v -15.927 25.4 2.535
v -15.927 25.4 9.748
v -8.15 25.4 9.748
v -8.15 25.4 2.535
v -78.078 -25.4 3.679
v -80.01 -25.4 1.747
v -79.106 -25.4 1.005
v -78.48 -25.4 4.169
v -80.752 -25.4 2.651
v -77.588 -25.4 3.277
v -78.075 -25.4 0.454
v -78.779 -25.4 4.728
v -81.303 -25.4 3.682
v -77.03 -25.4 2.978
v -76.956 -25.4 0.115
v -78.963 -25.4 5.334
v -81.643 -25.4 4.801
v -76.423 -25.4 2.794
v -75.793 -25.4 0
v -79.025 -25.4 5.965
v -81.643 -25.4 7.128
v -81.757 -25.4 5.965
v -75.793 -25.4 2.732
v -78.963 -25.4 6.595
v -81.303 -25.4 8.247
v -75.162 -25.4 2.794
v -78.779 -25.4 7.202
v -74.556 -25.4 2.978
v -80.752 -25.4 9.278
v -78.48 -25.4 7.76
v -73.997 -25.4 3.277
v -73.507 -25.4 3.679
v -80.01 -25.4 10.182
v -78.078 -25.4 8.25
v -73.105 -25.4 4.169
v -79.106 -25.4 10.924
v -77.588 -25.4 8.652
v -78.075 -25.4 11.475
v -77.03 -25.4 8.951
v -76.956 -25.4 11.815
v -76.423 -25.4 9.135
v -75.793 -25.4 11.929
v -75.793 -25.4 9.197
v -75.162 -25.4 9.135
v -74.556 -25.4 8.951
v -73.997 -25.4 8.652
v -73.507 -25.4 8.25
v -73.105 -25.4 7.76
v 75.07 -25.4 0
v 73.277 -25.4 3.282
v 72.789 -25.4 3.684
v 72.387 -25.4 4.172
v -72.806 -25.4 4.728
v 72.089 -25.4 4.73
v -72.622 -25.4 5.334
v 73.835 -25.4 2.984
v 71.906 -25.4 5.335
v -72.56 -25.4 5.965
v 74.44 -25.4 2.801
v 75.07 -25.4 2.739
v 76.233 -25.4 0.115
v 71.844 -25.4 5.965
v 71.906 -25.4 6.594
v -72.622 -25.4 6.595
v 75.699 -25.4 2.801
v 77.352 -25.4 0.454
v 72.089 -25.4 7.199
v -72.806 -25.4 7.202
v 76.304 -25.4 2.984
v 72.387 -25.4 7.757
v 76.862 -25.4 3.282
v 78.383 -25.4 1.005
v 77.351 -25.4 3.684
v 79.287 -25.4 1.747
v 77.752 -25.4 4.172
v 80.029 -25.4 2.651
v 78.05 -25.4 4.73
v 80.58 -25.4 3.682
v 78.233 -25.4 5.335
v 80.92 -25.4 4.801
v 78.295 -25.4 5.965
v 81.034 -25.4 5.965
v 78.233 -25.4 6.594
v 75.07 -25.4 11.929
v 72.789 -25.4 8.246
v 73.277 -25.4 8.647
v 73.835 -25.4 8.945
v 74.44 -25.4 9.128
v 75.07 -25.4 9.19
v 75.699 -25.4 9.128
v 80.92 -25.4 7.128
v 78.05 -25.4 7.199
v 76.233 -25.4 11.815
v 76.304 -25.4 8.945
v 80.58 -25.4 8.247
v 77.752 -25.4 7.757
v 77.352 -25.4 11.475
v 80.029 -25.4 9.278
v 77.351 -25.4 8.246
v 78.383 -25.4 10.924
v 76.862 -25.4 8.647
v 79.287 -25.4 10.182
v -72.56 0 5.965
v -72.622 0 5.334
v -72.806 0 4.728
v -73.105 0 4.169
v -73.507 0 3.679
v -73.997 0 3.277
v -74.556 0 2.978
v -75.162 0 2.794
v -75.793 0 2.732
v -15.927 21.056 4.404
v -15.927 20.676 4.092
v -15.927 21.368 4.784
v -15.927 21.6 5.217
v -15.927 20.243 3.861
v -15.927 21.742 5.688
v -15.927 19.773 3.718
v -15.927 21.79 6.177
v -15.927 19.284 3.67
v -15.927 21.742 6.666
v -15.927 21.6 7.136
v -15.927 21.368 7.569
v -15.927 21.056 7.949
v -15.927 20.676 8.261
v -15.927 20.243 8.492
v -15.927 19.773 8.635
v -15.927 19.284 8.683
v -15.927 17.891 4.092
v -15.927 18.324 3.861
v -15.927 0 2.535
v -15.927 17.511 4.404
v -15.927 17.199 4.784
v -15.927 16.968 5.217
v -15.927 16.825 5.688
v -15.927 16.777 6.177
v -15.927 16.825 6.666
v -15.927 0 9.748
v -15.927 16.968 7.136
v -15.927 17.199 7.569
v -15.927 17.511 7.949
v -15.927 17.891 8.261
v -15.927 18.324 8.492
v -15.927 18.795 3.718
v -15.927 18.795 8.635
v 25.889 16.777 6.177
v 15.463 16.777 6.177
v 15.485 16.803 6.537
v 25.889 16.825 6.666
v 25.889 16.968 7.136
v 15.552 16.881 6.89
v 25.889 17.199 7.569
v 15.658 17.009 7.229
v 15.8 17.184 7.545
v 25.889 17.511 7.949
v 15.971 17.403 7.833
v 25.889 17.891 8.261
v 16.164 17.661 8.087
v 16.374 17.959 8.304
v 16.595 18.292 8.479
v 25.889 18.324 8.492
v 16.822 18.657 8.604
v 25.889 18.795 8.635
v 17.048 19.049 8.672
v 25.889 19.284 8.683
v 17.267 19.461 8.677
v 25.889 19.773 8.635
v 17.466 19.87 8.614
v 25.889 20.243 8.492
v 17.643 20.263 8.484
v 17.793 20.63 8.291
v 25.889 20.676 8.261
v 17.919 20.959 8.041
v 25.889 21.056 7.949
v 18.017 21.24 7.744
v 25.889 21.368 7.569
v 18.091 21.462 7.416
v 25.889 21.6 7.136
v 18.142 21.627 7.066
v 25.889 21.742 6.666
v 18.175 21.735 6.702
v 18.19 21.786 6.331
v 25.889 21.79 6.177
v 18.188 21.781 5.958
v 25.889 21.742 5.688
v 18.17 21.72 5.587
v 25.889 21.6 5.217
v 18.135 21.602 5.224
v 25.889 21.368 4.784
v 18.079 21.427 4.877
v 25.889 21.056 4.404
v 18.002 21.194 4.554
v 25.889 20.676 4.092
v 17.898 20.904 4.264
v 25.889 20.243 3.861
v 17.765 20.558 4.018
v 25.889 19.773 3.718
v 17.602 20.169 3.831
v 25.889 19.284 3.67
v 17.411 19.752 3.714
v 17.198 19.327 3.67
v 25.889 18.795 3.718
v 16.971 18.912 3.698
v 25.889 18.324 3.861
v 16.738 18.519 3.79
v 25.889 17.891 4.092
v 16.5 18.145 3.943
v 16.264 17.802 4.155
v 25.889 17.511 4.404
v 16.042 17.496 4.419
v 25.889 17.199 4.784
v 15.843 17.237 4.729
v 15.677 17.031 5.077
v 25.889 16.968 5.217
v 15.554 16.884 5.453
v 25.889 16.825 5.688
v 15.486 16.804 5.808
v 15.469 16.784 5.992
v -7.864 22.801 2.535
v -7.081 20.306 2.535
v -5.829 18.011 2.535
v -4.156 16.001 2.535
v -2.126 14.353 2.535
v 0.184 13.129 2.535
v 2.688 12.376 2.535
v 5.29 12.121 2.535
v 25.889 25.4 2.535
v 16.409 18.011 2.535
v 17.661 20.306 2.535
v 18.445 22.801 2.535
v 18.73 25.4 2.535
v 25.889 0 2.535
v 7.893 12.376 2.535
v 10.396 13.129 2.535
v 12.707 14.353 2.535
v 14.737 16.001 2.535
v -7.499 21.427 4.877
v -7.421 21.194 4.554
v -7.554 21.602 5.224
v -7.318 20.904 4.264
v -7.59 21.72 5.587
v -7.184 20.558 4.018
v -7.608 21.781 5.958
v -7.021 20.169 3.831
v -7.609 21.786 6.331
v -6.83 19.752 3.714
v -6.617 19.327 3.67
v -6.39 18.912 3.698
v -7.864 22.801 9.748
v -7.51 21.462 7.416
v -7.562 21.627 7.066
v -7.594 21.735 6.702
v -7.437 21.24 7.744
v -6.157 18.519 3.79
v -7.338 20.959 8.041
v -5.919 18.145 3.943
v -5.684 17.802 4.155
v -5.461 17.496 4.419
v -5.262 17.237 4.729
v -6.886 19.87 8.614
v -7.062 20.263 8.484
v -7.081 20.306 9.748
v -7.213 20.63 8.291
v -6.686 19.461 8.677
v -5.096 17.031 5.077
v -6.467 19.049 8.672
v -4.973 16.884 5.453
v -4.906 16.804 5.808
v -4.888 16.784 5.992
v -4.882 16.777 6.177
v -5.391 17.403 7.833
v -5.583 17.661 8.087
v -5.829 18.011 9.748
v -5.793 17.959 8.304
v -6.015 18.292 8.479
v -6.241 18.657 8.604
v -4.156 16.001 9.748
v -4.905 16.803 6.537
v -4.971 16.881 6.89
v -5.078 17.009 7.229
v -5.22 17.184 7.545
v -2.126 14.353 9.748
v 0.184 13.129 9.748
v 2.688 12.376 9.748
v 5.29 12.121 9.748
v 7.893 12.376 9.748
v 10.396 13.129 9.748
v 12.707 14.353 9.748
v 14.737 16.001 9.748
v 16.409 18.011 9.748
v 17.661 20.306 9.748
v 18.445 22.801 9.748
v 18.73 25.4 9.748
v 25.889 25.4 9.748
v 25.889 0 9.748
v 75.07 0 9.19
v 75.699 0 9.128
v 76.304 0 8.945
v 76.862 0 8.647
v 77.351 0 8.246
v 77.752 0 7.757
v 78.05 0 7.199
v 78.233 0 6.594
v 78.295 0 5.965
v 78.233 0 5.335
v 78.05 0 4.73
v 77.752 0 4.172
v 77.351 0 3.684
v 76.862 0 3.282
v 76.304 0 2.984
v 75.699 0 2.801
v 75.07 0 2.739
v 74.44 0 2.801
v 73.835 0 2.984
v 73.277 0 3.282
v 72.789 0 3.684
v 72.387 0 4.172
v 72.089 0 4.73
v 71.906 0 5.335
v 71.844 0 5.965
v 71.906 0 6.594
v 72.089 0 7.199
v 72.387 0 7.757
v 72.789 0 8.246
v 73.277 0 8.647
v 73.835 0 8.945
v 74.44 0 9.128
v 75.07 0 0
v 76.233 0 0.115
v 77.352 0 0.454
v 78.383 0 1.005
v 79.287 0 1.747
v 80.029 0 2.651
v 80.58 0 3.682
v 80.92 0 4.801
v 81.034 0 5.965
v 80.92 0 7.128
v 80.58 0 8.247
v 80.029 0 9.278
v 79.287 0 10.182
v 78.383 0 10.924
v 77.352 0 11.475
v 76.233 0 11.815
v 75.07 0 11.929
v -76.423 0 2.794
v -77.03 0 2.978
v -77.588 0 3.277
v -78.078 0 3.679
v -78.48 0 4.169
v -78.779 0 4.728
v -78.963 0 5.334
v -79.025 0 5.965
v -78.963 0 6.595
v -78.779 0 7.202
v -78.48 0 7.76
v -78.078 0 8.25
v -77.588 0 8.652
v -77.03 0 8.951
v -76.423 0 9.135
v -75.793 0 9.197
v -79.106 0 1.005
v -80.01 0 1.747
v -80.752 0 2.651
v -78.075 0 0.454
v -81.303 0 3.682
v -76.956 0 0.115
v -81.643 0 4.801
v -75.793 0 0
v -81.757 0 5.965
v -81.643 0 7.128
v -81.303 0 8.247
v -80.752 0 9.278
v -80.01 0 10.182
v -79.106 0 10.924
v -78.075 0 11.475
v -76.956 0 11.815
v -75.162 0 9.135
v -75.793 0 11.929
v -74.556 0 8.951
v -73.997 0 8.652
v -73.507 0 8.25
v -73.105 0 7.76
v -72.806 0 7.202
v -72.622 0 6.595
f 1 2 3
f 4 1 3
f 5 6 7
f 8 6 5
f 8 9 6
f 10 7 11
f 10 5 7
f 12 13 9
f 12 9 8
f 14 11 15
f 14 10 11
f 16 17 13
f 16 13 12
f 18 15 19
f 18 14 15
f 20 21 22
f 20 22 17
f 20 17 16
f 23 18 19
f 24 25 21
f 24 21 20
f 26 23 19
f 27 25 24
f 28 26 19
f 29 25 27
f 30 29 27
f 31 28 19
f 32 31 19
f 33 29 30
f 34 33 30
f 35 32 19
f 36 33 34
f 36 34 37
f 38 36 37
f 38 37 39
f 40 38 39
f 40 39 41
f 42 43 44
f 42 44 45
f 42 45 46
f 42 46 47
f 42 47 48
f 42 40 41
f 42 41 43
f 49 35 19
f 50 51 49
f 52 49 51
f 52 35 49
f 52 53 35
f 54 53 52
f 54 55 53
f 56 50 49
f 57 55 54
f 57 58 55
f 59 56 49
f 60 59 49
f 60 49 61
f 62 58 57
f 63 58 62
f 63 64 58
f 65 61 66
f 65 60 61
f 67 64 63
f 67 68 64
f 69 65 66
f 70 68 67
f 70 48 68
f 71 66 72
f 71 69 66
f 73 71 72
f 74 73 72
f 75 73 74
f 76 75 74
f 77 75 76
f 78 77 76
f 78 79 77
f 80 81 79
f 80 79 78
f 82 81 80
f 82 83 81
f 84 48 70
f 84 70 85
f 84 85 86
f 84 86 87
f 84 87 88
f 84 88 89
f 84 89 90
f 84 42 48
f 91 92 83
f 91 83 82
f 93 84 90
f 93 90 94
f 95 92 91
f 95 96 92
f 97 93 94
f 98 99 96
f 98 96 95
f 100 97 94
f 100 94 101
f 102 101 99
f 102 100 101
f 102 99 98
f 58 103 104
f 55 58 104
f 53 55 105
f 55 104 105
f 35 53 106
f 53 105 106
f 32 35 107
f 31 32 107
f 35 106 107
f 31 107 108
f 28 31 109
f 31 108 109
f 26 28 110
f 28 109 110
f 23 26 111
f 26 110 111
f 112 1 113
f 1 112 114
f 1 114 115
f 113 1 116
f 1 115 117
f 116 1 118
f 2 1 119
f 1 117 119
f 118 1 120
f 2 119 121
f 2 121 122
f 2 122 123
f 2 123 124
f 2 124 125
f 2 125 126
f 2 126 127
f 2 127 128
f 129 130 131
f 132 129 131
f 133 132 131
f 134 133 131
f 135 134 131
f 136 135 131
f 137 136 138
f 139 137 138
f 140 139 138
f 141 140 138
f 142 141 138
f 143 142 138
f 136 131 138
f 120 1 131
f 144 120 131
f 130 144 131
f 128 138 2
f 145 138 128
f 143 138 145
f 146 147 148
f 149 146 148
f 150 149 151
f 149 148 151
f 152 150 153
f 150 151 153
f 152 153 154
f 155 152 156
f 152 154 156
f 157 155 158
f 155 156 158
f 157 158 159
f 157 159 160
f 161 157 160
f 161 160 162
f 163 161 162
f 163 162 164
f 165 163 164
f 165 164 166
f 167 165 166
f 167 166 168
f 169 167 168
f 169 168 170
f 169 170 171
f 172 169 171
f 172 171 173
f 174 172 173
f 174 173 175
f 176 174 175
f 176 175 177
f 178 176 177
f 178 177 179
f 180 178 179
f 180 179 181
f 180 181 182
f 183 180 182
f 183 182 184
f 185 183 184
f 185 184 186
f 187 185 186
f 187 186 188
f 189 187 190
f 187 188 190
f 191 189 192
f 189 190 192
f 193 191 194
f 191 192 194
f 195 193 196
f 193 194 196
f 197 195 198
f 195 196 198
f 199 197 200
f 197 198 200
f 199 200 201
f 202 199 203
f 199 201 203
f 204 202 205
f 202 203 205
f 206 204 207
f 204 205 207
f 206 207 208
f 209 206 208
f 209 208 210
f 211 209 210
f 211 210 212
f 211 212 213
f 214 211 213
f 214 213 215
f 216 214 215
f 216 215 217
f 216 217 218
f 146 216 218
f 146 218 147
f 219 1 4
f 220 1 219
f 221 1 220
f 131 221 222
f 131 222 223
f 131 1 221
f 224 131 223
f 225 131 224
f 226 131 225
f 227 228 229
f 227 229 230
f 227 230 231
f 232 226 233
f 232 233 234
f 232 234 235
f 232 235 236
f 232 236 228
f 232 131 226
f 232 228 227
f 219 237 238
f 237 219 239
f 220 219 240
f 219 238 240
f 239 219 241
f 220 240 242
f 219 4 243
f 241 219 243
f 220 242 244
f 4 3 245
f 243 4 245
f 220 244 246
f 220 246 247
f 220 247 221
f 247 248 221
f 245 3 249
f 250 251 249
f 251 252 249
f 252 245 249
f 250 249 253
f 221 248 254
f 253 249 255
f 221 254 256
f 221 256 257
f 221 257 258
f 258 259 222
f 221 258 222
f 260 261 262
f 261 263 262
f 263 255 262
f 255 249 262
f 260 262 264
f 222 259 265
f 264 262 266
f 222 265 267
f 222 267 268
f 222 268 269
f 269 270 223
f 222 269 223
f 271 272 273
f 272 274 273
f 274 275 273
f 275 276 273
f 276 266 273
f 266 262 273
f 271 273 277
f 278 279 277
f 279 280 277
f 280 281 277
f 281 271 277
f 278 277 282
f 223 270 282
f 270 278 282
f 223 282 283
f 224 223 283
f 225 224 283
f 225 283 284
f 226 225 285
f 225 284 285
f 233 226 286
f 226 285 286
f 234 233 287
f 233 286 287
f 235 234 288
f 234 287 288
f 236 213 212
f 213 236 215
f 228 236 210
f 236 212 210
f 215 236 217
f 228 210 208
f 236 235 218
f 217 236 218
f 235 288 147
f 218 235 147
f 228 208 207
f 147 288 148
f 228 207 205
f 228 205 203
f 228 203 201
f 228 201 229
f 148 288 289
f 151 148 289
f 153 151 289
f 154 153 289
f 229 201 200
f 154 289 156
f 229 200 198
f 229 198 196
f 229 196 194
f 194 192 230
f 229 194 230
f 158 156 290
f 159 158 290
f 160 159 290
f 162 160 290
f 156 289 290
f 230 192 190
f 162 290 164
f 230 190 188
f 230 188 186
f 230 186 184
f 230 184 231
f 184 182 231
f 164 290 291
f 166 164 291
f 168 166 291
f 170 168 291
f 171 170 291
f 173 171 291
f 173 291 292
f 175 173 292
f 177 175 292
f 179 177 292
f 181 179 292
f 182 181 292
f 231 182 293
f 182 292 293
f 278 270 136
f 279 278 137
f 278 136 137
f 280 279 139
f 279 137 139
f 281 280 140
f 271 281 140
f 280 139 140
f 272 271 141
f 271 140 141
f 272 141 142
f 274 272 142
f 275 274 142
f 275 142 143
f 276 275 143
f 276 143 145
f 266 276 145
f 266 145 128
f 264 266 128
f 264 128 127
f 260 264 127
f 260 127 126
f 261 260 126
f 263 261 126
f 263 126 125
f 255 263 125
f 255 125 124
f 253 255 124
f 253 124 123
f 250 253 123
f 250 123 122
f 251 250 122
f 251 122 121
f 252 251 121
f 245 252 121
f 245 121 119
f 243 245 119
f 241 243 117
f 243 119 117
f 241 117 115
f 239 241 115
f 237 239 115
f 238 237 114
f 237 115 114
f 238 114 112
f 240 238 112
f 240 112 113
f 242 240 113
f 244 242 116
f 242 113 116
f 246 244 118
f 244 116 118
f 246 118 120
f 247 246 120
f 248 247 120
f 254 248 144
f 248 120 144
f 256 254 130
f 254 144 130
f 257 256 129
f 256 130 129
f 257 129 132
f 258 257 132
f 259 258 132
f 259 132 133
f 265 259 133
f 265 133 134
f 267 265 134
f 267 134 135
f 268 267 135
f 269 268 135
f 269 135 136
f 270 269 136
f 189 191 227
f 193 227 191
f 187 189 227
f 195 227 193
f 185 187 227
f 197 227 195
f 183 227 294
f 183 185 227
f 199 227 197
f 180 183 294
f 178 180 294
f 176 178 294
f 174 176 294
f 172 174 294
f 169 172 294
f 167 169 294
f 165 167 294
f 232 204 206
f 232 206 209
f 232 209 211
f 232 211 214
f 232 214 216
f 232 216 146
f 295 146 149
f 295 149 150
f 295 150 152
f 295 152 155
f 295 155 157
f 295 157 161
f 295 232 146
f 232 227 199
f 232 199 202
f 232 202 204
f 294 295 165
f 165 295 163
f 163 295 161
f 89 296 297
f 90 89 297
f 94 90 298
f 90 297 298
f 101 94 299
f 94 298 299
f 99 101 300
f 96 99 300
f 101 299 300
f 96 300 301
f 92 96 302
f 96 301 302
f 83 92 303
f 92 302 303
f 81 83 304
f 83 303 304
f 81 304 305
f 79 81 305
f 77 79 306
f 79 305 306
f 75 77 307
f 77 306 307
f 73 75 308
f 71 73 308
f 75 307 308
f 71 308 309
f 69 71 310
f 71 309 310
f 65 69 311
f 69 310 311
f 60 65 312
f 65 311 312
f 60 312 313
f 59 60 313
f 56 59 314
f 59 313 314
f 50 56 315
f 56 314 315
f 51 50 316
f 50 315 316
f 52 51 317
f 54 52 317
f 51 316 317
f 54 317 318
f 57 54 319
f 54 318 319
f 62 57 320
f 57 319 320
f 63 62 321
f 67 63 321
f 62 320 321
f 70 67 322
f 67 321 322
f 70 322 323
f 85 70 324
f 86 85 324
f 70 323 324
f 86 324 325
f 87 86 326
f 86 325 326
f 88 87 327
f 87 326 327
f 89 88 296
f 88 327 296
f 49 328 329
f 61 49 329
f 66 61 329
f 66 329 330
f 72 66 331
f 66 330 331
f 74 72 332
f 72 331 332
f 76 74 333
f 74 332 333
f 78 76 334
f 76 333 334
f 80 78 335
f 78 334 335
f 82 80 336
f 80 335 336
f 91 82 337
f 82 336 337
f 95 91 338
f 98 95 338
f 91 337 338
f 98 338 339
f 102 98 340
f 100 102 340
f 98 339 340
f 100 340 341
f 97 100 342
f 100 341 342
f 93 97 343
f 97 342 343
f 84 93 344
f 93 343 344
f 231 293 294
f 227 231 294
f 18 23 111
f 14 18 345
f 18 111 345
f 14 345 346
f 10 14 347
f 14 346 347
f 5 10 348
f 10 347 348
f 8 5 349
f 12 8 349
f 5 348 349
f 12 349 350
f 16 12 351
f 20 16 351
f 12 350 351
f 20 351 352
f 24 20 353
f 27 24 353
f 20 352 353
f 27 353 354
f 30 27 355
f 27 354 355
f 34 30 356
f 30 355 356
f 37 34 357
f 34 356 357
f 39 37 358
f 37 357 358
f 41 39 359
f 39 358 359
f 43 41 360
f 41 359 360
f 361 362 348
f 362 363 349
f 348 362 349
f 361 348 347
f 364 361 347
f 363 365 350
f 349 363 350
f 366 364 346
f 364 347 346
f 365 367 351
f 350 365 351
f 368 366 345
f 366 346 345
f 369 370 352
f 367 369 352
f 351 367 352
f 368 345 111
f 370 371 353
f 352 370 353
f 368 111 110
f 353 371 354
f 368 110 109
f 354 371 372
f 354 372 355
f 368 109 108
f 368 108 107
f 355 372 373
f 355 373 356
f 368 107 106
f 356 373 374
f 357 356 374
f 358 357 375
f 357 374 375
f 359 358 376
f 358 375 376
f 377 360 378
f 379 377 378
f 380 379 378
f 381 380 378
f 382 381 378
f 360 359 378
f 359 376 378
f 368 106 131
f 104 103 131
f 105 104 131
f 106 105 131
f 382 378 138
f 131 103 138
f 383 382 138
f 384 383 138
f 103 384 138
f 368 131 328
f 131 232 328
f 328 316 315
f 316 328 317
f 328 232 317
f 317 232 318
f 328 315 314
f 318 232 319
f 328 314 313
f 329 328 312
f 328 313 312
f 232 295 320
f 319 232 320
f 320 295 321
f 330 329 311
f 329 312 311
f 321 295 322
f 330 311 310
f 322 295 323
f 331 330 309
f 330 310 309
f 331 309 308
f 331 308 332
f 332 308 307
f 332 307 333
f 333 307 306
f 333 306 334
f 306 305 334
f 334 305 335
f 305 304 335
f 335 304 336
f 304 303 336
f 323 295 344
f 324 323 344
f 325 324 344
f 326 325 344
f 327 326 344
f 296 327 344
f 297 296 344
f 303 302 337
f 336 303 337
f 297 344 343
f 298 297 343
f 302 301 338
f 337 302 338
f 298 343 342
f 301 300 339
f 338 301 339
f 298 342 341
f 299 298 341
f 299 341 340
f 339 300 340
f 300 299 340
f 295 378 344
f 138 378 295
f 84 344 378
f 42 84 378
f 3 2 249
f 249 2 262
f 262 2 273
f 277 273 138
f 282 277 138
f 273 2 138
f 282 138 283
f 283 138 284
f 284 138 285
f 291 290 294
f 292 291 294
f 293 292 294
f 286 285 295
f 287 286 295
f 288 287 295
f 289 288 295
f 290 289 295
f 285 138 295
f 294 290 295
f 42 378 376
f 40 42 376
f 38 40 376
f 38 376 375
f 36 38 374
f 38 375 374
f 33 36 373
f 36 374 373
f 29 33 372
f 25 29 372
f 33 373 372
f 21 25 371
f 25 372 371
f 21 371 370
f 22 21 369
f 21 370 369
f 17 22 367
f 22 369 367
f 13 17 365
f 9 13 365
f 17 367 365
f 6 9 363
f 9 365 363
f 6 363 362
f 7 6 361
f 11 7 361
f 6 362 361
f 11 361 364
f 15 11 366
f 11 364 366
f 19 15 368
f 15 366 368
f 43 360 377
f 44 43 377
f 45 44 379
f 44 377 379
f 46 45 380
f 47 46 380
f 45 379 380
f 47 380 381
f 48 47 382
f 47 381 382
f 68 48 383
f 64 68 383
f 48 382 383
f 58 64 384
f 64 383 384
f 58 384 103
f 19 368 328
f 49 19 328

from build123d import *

# Parameters (mm, degrees)
F1_DEPTH = 25.4
F2_W     = 41.815902
F2_H     = 7.212999
F3_DEPTH = 25.4
F5_DEPTH = 7.62
F6_R     = 2.506654
F7_DEPTH = 45.974


with BuildPart() as f1:
    # F0 (on Front) → F1 (new body)
    with BuildSketch(Plane.XZ):
        with BuildLine():
            Line((75.069629, 11.929201), (-75.792603, 11.929201))
            Line((-75.792603, 11.929201), (-75.792603, 9.196899))
            ThreePointArc((-75.792603, 9.196899), (-73.507023, 8.250181), (-72.560304, 5.9646))
            ThreePointArc((-72.560304, 5.9646), (-73.507023, 3.67902), (-75.792603, 2.732302))
            Line((-75.792603, 2.732302), (-75.792603, 0))
            Line((-75.792603, 0), (75.069629, 0))
            Line((75.069629, 0), (75.069629, 2.7388))
            ThreePointArc((75.069629, 2.7388), (71.843829, 5.9646), (75.069629, 9.1904))
            Line((75.069629, 9.1904), (75.069629, 11.929201))
        make_face()
        with BuildLine():
            Line((-75.792603, 9.196899), (-75.792603, 11.929201))
            ThreePointArc((-75.792603, 11.929201), (-81.757204, 5.9646), (-75.792603, 0))
            Line((-75.792603, 0), (-75.792603, 2.732302))
            ThreePointArc((-75.792603, 2.732302), (-79.024902, 5.9646), (-75.792603, 9.196899))
        make_face()
        with BuildLine():
            ThreePointArc((75.069629, 0), (81.034229, 5.9646), (75.069629, 11.929201))
            Line((75.069629, 11.929201), (75.069629, 9.1904))
            ThreePointArc((75.069629, 9.1904), (77.350614, 8.245586), (78.295429, 5.9646))
            ThreePointArc((78.295429, 5.9646), (77.350614, 3.683615), (75.069629, 2.7388))
            Line((75.069629, 2.7388), (75.069629, 0))
        make_face()
    extrude(amount=F1_DEPTH)

    # F2 (on Front) → F3 (join)
    with BuildSketch(Plane.XZ):
        with Locations((4.981325, 6.141954)):
            Rectangle(F2_W, F2_H)
    extrude(amount=-F3_DEPTH)

    # F4 (on face) → F5 (cut)
    with BuildSketch(Plane.XY.offset(9.748454)):
        with BuildLine():
            Line((18.730404, 25.4), (-8.149876, 25.4))
            ThreePointArc((-8.149876, 25.4), (5.290264, 12.121353), (18.730404, 25.4))
        make_face()
    extrude(amount=-F5_DEPTH, mode=Mode.SUBTRACT)

    # F6 (on face) → F7 (cut)
    with BuildSketch(Plane(origin=(-15.926626, 0, 0), x_dir=(0, -1, 0), z_dir=(-1, 0, 0))):
        with Locations((-19.283704, 6.176639)):
            Circle(F6_R)
    extrude(amount=-F7_DEPTH, mode=Mode.SUBTRACT)


solid = f1.part
